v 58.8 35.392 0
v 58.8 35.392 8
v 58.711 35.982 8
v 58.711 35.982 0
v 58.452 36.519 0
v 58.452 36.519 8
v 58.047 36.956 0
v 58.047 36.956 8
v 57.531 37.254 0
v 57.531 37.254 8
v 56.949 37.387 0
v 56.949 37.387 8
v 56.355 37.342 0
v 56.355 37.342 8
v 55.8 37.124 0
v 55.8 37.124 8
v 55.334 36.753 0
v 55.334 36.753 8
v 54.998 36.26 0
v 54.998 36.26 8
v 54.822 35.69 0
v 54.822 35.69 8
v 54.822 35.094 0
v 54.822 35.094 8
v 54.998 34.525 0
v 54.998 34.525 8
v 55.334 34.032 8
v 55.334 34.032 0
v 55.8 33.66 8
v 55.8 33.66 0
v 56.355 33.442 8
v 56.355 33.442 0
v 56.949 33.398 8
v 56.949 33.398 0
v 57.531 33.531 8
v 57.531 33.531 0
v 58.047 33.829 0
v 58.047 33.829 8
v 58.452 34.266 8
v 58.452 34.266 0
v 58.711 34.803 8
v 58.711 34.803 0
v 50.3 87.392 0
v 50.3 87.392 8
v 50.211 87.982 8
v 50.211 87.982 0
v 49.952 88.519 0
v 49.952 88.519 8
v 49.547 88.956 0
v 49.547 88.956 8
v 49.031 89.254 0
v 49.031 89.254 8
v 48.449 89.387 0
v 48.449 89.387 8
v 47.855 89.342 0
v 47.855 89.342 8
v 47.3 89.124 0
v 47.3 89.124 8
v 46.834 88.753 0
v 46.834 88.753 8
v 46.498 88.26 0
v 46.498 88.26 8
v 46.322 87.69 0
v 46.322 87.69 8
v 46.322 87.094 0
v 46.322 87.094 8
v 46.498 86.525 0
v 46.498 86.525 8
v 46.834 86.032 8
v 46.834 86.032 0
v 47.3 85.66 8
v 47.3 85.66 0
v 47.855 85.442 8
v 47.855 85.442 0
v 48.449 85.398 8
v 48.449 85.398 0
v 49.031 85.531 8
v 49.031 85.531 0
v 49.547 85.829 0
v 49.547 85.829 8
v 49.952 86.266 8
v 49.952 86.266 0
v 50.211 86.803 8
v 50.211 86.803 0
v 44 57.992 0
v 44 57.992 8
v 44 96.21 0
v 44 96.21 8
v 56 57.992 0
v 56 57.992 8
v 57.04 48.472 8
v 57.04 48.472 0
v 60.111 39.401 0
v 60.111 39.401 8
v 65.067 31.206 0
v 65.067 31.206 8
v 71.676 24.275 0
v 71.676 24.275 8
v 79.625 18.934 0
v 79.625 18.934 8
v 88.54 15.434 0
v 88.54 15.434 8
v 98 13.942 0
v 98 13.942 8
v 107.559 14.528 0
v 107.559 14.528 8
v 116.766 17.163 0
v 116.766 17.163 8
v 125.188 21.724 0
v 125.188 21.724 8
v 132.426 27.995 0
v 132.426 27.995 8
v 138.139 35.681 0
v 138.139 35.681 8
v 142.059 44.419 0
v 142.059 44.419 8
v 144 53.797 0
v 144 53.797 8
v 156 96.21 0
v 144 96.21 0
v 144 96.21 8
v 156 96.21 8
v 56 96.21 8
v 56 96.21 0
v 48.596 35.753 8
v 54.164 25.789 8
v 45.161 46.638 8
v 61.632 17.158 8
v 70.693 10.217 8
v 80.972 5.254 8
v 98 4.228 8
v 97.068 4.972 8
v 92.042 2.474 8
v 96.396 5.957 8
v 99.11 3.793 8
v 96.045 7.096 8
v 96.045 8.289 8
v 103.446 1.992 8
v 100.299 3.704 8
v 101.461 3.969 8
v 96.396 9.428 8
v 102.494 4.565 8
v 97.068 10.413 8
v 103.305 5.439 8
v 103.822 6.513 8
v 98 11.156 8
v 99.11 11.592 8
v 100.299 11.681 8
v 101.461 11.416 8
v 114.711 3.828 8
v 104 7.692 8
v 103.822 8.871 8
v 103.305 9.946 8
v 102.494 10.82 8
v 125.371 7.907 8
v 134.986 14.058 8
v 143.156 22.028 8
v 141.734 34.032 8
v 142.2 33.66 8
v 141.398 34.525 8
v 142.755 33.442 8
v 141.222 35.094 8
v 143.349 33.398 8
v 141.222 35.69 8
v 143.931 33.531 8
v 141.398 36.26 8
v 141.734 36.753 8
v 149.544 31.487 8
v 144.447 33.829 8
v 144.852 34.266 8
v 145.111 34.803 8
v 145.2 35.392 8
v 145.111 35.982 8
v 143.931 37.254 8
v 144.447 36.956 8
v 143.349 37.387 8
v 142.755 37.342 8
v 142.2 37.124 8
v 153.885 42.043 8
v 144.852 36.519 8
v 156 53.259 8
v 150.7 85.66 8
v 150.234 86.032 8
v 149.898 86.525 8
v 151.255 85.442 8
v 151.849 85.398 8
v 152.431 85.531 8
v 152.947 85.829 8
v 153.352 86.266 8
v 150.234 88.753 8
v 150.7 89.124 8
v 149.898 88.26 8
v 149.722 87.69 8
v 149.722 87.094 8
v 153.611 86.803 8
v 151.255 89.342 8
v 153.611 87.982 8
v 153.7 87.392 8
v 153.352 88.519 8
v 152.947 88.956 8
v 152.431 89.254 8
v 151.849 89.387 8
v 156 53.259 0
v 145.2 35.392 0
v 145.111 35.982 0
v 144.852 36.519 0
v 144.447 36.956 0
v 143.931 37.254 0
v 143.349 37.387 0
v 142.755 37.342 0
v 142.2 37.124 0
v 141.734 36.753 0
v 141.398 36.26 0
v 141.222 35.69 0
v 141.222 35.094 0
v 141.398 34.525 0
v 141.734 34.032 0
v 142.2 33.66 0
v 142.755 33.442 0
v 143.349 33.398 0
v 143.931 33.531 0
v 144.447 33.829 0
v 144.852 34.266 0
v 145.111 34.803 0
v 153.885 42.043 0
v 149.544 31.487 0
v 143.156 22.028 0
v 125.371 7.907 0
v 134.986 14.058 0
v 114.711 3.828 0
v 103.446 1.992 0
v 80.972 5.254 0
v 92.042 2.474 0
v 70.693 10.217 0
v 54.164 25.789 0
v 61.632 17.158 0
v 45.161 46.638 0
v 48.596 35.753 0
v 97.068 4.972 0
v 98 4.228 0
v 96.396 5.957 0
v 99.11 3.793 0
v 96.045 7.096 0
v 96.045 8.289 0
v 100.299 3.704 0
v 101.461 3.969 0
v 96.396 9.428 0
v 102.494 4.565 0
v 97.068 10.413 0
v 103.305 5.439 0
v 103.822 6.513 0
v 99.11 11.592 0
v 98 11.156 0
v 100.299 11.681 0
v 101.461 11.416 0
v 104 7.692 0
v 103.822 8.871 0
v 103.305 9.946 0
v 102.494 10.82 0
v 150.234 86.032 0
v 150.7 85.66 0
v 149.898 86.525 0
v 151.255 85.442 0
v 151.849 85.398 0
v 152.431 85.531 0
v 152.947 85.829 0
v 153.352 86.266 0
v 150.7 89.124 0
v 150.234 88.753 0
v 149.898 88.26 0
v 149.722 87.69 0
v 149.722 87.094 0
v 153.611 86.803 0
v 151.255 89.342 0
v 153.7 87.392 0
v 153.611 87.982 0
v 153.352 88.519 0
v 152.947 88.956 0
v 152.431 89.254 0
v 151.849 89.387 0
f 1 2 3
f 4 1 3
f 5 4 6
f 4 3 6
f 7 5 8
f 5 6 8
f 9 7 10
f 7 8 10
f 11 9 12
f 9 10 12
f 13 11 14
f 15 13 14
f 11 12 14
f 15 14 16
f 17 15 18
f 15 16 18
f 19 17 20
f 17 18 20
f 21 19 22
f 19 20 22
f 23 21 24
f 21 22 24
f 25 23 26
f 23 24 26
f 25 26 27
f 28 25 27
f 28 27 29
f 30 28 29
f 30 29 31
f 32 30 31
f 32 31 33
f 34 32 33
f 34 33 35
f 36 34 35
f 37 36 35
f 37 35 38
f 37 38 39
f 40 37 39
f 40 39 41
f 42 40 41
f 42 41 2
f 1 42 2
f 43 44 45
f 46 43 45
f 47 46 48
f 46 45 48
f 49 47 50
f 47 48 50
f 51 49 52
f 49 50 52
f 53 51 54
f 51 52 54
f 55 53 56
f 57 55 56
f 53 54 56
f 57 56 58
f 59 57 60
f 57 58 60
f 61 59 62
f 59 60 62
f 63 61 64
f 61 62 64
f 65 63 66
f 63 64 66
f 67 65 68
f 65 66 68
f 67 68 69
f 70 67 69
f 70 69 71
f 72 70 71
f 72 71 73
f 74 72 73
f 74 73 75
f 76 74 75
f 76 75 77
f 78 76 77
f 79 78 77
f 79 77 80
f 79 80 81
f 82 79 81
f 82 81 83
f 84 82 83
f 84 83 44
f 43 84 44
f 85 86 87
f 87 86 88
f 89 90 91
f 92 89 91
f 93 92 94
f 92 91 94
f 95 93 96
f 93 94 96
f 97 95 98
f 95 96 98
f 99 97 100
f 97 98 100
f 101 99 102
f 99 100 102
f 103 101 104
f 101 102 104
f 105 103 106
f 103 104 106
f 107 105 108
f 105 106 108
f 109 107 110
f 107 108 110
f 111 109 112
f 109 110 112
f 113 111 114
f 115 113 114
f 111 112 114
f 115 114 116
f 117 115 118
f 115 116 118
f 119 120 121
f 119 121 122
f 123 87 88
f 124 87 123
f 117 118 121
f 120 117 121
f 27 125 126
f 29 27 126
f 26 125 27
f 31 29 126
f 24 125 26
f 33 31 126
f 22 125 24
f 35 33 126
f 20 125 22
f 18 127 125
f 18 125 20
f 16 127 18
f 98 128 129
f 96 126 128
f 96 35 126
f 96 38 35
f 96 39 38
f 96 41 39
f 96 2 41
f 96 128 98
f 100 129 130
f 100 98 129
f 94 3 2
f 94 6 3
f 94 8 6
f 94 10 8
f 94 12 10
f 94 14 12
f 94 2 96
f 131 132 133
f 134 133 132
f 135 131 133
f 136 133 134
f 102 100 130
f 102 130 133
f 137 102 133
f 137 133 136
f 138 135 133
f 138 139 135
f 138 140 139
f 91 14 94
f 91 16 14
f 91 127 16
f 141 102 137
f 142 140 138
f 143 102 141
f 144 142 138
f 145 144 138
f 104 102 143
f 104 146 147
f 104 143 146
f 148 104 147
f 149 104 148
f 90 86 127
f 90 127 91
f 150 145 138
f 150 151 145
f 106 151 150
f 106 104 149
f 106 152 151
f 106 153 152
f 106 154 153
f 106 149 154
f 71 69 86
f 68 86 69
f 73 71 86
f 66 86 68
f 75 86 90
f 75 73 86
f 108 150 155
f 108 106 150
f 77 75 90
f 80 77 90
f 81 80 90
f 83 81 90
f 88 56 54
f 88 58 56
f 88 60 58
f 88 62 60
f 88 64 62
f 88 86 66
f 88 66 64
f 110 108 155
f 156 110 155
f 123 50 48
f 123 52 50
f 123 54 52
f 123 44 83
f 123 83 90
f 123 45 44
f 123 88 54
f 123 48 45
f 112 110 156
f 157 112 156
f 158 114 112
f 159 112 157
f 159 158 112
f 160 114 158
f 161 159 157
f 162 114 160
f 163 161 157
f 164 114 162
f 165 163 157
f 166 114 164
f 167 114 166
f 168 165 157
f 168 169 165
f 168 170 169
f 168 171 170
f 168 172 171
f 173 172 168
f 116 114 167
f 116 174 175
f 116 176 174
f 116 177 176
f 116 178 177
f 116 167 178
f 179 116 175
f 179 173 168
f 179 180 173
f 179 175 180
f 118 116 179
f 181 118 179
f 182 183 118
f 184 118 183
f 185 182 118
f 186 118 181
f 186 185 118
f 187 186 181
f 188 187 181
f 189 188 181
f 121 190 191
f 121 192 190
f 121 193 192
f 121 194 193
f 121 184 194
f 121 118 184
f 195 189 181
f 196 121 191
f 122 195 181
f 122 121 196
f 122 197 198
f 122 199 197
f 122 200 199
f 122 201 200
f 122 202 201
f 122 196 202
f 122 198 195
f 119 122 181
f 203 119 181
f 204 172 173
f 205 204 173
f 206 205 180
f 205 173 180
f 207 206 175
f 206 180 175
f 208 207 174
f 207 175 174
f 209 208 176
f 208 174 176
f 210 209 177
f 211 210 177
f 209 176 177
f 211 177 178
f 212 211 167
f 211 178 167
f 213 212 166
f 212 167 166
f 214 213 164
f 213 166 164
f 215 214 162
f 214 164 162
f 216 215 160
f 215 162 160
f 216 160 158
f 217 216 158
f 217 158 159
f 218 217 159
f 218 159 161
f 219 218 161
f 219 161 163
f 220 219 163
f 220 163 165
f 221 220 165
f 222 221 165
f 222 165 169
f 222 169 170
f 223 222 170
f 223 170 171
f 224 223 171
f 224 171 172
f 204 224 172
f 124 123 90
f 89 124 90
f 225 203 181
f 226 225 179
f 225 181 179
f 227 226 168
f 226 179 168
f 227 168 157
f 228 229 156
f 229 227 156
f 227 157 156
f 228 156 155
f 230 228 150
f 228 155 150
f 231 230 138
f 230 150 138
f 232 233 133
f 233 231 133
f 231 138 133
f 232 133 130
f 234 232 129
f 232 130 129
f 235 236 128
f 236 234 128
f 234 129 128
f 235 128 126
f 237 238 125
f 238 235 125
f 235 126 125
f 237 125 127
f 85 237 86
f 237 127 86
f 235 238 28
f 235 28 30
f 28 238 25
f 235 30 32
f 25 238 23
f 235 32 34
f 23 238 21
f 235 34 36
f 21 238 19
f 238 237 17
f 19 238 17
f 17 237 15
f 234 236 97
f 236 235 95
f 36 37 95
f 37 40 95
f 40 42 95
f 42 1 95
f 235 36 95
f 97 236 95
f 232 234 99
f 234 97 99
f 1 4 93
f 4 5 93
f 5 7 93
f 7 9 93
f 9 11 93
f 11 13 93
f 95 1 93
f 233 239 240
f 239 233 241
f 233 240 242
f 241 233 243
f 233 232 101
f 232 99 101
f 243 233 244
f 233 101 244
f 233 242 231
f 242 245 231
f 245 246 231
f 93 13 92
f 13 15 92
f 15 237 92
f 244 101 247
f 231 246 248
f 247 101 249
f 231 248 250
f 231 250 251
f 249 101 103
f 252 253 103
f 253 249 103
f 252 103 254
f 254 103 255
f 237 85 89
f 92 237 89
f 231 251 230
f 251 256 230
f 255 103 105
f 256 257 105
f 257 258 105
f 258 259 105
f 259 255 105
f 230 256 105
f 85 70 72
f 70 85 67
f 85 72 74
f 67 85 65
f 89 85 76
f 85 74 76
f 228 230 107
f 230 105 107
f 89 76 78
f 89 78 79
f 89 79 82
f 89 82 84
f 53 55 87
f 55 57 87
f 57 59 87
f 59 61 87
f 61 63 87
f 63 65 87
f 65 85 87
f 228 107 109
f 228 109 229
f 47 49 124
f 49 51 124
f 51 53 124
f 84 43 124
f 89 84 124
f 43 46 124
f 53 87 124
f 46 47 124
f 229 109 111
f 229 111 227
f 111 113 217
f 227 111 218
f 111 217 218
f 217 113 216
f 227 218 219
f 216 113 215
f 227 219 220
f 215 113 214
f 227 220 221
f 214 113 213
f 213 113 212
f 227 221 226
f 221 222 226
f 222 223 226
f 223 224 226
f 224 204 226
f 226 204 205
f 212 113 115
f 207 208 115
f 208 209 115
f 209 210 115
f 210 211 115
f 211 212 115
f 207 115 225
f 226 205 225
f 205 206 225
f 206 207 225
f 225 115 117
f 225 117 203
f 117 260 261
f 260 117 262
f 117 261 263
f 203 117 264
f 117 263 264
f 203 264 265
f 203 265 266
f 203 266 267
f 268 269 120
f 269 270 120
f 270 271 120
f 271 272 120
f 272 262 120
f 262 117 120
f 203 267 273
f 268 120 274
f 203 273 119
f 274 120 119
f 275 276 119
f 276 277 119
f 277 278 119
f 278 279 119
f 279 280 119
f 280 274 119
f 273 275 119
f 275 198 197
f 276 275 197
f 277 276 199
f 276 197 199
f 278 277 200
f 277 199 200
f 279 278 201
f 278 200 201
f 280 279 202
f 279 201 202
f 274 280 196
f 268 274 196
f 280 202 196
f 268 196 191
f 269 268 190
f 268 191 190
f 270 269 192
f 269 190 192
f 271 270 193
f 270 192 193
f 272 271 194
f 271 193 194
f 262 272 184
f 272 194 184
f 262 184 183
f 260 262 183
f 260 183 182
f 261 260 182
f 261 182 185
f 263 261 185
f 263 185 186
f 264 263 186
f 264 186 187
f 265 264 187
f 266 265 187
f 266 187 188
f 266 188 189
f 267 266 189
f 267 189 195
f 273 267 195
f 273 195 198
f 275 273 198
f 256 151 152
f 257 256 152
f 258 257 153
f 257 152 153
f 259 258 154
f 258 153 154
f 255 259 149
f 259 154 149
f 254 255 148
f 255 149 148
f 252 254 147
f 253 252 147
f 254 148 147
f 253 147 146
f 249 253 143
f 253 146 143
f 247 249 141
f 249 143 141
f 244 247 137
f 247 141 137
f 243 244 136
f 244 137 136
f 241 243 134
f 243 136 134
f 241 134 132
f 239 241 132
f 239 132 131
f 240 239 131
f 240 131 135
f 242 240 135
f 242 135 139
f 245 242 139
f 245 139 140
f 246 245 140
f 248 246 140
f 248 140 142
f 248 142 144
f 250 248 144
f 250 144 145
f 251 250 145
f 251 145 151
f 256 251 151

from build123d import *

# Parameters (mm, degrees)
SKETCH_1_W          = 200
SKETCH_1_H          = 100
EXTRUDE_1_DEPTH     = 8
SKETCH_2_OUTSIDE_W  = 246.75
SKETCH_2_OUTSIDE_H  = 146.75
CUT_EXTRUDE_1_DEPTH = 223.081848133
SKETCH_3_R          = 2
SKETCH_3_R_2        = 4
CUT_EXTRUDE_2_DEPTH = 184.742611471


with BuildPart() as part:
    # 草图1 → 凸台-拉伸1 (new body)
    with BuildSketch(Plane.XY):
        with Locations((100, 46.209912536)):
            Rectangle(SKETCH_1_W, SKETCH_1_H)
    extrude(amount=EXTRUDE_1_DEPTH)

    # 草图2 outside → 切除-拉伸1 (cut, through all)
    with BuildSketch(Plane.XY.offset(8)):
        with Locations((100, 46.21)):
            Rectangle(SKETCH_2_OUTSIDE_W, SKETCH_2_OUTSIDE_H)
        with BuildLine():
            Line((156, 96.209912536), (156, 53.259476571))
            ThreePointArc((156, 53.259476571), (97.731456144, 1.942362699), (44, 57.992340397))
            Line((44, 57.992340397), (44, 96.209912536))
            Line((44, 96.209912536), (56, 96.209912536))
            Line((56, 96.209912536), (56, 57.992340397))
            ThreePointArc((56, 57.992340397), (98, 13.942368774), (144, 53.797105004))
            Line((144, 53.797105004), (144, 96.209912536))
            Line((144, 96.209912536), (156, 96.209912536))
        make_face(mode=Mode.SUBTRACT)
    extrude(amount=-CUT_EXTRUDE_1_DEPTH, mode=Mode.SUBTRACT)

    # 草图3 → 切除-拉伸2 (cut, through all)
    with BuildSketch(Plane.XY.offset(13)):
        with Locations((48.3, 87.392340397)):
            Circle(SKETCH_3_R)
        with Locations((56.8, 35.392340397)):
            Circle(SKETCH_3_R)
        with Locations((143.2, 35.392340397)):
            Circle(SKETCH_3_R)
        with Locations((151.7, 87.392340397)):
            Circle(SKETCH_3_R)
        with Locations((100, 7.692340397)):
            Circle(SKETCH_3_R_2)
    extrude(amount=-CUT_EXTRUDE_2_DEPTH, mode=Mode.SUBTRACT)


solid = part.part
